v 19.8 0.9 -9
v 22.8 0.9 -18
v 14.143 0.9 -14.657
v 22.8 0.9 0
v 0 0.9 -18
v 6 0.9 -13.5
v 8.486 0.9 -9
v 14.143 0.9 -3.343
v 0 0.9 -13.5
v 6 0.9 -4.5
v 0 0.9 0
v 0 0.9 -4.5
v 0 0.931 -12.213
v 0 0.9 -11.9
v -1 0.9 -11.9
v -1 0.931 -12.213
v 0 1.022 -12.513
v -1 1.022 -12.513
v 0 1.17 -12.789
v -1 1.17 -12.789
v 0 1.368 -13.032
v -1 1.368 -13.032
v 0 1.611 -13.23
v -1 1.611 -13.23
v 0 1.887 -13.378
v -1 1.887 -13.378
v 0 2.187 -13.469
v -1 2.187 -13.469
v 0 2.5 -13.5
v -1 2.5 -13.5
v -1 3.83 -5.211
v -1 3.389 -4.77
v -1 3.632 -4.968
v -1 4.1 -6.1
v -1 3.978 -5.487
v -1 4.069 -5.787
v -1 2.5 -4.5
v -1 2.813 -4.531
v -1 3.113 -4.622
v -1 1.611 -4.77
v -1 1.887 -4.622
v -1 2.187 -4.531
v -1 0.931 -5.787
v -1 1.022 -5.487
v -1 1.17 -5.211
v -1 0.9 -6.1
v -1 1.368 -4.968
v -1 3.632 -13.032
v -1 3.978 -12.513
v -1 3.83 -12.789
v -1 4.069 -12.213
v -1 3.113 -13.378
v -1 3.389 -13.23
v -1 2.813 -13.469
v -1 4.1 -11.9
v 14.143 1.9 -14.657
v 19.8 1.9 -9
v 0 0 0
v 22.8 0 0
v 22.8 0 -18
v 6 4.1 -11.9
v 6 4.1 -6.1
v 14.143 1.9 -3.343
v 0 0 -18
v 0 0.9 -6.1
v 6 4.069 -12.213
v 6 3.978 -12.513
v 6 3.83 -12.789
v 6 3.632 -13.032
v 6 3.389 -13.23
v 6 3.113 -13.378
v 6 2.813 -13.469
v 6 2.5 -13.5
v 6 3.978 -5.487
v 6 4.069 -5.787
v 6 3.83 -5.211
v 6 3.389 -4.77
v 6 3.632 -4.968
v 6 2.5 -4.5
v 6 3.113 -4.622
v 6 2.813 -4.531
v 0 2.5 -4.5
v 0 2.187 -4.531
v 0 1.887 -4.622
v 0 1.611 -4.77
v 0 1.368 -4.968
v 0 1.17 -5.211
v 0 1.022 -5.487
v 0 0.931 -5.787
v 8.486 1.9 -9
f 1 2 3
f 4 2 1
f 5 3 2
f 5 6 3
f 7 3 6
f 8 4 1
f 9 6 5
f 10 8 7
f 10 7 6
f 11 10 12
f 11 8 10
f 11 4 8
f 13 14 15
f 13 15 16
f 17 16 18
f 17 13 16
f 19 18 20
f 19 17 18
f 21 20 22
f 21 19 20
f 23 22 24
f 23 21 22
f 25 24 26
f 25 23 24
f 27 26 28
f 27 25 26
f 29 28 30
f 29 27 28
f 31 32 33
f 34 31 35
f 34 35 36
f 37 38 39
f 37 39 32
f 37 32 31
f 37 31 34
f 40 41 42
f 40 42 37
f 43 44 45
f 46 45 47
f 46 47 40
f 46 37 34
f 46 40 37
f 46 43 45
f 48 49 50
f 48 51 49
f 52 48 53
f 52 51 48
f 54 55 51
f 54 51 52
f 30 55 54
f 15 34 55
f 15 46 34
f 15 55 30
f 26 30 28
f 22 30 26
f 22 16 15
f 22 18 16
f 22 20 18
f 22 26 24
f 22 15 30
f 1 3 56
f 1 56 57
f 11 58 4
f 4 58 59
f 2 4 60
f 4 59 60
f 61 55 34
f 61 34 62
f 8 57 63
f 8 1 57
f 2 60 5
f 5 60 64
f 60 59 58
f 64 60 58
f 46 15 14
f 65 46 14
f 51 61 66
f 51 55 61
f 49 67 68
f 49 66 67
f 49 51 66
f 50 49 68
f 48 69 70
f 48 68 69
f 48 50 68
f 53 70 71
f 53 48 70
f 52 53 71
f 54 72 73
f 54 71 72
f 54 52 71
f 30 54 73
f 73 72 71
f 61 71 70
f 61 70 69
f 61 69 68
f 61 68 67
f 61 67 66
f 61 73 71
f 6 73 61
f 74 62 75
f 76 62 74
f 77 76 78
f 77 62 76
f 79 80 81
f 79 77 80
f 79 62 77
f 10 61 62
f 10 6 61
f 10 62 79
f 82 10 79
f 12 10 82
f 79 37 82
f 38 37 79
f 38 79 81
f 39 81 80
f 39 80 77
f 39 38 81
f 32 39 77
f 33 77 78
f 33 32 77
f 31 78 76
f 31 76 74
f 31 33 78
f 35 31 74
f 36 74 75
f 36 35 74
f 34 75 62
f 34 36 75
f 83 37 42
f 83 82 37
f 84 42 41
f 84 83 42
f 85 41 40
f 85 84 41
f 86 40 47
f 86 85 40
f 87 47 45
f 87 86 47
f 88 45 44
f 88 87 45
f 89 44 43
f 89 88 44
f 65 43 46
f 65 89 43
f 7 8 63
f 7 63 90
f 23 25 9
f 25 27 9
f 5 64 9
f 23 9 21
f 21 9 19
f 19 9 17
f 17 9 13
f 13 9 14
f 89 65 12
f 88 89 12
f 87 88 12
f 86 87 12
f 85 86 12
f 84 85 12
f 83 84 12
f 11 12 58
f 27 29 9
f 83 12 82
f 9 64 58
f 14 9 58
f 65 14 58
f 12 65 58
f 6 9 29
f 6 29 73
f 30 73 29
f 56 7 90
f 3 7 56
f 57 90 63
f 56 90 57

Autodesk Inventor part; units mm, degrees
ref_plane "YZ Plane" through (0, 0, 0) normal (1, 0, 0) x (0, 1, 0)
ref_plane "XZ Plane" through (0, 0, 0) normal (0, 1, 0) x (-1, 0, 0)
ref_plane "XY Plane" through (0, 0, 0) normal (0, 0, 1) x (1, 0, 0)
sketch "Sketch1" plane through (0, 0, 0) normal (0, 1, 0) x (-1, 0, 0)
  line L0 (0, 0) -> (-22.8, 0)
  line L1 (-22.8, 0) -> (-22.8, -18)
  line L2 (-22.8, -18) -> (0, -18)
  line L3 (0, -18) -> (0, 0)
  dimension "d0" = 22.8
  dimension "d1" = 18
extrude "Extrusion1" add sketch "Sketch1" along normal blind 0.9
sketch "Sketch2" plane through (0, 0.9, 0) normal (0, 1, 0) x (1, 0, 0)
  line L0 (14.1431, 3.3431) -> (8.4863, 9)
  line L1 (8.4863, 9) -> (14.1431, 14.6569)
  line L2 (14.1431, 14.6569) -> (19.8, 9)
  line L3 (19.8, 9) -> (14.1431, 3.3431)
  line L4 (22.8, 0) -> (22.8, 18) projected
  point P0 (0, 0)
  point P1 (22.8, 9)
  dimension "d4" = 135
  dimension "d5" = 8
  dimension "d6" = 3
extrude "Extrusion2" add sketch "Sketch2" along normal blind 1
sketch "Sketch3" plane through (0, 0.9, 0) normal (0, 1, 0) x (1, 0, 0)
  line L0 (6, 4.5) -> (-1, 4.5)
  line L1 (-1, 4.5) -> (-1, 13.5)
  line L2 (-1, 13.5) -> (6, 13.5)
  line L3 (6, 13.5) -> (6, 4.5)
  line L4 (0, 18) -> (0, 0) projected
  point P0 (-1, 9)
  point P1 (0, 9)
  dimension "d9" = 7
  dimension "d10" = 1
  dimension "d11" = 9
extrude "Extrusion3" add sketch "Sketch3" along normal blind 3.2
fillet "Fillet1" radius 1.6 4 edges at (2.5, 4.1, -4.5) (2.5, 4.1, -13.5) (-0.5, 0.9, -4.5) (-0.5, 0.9, -13.5)
properties part number "rp2040"
